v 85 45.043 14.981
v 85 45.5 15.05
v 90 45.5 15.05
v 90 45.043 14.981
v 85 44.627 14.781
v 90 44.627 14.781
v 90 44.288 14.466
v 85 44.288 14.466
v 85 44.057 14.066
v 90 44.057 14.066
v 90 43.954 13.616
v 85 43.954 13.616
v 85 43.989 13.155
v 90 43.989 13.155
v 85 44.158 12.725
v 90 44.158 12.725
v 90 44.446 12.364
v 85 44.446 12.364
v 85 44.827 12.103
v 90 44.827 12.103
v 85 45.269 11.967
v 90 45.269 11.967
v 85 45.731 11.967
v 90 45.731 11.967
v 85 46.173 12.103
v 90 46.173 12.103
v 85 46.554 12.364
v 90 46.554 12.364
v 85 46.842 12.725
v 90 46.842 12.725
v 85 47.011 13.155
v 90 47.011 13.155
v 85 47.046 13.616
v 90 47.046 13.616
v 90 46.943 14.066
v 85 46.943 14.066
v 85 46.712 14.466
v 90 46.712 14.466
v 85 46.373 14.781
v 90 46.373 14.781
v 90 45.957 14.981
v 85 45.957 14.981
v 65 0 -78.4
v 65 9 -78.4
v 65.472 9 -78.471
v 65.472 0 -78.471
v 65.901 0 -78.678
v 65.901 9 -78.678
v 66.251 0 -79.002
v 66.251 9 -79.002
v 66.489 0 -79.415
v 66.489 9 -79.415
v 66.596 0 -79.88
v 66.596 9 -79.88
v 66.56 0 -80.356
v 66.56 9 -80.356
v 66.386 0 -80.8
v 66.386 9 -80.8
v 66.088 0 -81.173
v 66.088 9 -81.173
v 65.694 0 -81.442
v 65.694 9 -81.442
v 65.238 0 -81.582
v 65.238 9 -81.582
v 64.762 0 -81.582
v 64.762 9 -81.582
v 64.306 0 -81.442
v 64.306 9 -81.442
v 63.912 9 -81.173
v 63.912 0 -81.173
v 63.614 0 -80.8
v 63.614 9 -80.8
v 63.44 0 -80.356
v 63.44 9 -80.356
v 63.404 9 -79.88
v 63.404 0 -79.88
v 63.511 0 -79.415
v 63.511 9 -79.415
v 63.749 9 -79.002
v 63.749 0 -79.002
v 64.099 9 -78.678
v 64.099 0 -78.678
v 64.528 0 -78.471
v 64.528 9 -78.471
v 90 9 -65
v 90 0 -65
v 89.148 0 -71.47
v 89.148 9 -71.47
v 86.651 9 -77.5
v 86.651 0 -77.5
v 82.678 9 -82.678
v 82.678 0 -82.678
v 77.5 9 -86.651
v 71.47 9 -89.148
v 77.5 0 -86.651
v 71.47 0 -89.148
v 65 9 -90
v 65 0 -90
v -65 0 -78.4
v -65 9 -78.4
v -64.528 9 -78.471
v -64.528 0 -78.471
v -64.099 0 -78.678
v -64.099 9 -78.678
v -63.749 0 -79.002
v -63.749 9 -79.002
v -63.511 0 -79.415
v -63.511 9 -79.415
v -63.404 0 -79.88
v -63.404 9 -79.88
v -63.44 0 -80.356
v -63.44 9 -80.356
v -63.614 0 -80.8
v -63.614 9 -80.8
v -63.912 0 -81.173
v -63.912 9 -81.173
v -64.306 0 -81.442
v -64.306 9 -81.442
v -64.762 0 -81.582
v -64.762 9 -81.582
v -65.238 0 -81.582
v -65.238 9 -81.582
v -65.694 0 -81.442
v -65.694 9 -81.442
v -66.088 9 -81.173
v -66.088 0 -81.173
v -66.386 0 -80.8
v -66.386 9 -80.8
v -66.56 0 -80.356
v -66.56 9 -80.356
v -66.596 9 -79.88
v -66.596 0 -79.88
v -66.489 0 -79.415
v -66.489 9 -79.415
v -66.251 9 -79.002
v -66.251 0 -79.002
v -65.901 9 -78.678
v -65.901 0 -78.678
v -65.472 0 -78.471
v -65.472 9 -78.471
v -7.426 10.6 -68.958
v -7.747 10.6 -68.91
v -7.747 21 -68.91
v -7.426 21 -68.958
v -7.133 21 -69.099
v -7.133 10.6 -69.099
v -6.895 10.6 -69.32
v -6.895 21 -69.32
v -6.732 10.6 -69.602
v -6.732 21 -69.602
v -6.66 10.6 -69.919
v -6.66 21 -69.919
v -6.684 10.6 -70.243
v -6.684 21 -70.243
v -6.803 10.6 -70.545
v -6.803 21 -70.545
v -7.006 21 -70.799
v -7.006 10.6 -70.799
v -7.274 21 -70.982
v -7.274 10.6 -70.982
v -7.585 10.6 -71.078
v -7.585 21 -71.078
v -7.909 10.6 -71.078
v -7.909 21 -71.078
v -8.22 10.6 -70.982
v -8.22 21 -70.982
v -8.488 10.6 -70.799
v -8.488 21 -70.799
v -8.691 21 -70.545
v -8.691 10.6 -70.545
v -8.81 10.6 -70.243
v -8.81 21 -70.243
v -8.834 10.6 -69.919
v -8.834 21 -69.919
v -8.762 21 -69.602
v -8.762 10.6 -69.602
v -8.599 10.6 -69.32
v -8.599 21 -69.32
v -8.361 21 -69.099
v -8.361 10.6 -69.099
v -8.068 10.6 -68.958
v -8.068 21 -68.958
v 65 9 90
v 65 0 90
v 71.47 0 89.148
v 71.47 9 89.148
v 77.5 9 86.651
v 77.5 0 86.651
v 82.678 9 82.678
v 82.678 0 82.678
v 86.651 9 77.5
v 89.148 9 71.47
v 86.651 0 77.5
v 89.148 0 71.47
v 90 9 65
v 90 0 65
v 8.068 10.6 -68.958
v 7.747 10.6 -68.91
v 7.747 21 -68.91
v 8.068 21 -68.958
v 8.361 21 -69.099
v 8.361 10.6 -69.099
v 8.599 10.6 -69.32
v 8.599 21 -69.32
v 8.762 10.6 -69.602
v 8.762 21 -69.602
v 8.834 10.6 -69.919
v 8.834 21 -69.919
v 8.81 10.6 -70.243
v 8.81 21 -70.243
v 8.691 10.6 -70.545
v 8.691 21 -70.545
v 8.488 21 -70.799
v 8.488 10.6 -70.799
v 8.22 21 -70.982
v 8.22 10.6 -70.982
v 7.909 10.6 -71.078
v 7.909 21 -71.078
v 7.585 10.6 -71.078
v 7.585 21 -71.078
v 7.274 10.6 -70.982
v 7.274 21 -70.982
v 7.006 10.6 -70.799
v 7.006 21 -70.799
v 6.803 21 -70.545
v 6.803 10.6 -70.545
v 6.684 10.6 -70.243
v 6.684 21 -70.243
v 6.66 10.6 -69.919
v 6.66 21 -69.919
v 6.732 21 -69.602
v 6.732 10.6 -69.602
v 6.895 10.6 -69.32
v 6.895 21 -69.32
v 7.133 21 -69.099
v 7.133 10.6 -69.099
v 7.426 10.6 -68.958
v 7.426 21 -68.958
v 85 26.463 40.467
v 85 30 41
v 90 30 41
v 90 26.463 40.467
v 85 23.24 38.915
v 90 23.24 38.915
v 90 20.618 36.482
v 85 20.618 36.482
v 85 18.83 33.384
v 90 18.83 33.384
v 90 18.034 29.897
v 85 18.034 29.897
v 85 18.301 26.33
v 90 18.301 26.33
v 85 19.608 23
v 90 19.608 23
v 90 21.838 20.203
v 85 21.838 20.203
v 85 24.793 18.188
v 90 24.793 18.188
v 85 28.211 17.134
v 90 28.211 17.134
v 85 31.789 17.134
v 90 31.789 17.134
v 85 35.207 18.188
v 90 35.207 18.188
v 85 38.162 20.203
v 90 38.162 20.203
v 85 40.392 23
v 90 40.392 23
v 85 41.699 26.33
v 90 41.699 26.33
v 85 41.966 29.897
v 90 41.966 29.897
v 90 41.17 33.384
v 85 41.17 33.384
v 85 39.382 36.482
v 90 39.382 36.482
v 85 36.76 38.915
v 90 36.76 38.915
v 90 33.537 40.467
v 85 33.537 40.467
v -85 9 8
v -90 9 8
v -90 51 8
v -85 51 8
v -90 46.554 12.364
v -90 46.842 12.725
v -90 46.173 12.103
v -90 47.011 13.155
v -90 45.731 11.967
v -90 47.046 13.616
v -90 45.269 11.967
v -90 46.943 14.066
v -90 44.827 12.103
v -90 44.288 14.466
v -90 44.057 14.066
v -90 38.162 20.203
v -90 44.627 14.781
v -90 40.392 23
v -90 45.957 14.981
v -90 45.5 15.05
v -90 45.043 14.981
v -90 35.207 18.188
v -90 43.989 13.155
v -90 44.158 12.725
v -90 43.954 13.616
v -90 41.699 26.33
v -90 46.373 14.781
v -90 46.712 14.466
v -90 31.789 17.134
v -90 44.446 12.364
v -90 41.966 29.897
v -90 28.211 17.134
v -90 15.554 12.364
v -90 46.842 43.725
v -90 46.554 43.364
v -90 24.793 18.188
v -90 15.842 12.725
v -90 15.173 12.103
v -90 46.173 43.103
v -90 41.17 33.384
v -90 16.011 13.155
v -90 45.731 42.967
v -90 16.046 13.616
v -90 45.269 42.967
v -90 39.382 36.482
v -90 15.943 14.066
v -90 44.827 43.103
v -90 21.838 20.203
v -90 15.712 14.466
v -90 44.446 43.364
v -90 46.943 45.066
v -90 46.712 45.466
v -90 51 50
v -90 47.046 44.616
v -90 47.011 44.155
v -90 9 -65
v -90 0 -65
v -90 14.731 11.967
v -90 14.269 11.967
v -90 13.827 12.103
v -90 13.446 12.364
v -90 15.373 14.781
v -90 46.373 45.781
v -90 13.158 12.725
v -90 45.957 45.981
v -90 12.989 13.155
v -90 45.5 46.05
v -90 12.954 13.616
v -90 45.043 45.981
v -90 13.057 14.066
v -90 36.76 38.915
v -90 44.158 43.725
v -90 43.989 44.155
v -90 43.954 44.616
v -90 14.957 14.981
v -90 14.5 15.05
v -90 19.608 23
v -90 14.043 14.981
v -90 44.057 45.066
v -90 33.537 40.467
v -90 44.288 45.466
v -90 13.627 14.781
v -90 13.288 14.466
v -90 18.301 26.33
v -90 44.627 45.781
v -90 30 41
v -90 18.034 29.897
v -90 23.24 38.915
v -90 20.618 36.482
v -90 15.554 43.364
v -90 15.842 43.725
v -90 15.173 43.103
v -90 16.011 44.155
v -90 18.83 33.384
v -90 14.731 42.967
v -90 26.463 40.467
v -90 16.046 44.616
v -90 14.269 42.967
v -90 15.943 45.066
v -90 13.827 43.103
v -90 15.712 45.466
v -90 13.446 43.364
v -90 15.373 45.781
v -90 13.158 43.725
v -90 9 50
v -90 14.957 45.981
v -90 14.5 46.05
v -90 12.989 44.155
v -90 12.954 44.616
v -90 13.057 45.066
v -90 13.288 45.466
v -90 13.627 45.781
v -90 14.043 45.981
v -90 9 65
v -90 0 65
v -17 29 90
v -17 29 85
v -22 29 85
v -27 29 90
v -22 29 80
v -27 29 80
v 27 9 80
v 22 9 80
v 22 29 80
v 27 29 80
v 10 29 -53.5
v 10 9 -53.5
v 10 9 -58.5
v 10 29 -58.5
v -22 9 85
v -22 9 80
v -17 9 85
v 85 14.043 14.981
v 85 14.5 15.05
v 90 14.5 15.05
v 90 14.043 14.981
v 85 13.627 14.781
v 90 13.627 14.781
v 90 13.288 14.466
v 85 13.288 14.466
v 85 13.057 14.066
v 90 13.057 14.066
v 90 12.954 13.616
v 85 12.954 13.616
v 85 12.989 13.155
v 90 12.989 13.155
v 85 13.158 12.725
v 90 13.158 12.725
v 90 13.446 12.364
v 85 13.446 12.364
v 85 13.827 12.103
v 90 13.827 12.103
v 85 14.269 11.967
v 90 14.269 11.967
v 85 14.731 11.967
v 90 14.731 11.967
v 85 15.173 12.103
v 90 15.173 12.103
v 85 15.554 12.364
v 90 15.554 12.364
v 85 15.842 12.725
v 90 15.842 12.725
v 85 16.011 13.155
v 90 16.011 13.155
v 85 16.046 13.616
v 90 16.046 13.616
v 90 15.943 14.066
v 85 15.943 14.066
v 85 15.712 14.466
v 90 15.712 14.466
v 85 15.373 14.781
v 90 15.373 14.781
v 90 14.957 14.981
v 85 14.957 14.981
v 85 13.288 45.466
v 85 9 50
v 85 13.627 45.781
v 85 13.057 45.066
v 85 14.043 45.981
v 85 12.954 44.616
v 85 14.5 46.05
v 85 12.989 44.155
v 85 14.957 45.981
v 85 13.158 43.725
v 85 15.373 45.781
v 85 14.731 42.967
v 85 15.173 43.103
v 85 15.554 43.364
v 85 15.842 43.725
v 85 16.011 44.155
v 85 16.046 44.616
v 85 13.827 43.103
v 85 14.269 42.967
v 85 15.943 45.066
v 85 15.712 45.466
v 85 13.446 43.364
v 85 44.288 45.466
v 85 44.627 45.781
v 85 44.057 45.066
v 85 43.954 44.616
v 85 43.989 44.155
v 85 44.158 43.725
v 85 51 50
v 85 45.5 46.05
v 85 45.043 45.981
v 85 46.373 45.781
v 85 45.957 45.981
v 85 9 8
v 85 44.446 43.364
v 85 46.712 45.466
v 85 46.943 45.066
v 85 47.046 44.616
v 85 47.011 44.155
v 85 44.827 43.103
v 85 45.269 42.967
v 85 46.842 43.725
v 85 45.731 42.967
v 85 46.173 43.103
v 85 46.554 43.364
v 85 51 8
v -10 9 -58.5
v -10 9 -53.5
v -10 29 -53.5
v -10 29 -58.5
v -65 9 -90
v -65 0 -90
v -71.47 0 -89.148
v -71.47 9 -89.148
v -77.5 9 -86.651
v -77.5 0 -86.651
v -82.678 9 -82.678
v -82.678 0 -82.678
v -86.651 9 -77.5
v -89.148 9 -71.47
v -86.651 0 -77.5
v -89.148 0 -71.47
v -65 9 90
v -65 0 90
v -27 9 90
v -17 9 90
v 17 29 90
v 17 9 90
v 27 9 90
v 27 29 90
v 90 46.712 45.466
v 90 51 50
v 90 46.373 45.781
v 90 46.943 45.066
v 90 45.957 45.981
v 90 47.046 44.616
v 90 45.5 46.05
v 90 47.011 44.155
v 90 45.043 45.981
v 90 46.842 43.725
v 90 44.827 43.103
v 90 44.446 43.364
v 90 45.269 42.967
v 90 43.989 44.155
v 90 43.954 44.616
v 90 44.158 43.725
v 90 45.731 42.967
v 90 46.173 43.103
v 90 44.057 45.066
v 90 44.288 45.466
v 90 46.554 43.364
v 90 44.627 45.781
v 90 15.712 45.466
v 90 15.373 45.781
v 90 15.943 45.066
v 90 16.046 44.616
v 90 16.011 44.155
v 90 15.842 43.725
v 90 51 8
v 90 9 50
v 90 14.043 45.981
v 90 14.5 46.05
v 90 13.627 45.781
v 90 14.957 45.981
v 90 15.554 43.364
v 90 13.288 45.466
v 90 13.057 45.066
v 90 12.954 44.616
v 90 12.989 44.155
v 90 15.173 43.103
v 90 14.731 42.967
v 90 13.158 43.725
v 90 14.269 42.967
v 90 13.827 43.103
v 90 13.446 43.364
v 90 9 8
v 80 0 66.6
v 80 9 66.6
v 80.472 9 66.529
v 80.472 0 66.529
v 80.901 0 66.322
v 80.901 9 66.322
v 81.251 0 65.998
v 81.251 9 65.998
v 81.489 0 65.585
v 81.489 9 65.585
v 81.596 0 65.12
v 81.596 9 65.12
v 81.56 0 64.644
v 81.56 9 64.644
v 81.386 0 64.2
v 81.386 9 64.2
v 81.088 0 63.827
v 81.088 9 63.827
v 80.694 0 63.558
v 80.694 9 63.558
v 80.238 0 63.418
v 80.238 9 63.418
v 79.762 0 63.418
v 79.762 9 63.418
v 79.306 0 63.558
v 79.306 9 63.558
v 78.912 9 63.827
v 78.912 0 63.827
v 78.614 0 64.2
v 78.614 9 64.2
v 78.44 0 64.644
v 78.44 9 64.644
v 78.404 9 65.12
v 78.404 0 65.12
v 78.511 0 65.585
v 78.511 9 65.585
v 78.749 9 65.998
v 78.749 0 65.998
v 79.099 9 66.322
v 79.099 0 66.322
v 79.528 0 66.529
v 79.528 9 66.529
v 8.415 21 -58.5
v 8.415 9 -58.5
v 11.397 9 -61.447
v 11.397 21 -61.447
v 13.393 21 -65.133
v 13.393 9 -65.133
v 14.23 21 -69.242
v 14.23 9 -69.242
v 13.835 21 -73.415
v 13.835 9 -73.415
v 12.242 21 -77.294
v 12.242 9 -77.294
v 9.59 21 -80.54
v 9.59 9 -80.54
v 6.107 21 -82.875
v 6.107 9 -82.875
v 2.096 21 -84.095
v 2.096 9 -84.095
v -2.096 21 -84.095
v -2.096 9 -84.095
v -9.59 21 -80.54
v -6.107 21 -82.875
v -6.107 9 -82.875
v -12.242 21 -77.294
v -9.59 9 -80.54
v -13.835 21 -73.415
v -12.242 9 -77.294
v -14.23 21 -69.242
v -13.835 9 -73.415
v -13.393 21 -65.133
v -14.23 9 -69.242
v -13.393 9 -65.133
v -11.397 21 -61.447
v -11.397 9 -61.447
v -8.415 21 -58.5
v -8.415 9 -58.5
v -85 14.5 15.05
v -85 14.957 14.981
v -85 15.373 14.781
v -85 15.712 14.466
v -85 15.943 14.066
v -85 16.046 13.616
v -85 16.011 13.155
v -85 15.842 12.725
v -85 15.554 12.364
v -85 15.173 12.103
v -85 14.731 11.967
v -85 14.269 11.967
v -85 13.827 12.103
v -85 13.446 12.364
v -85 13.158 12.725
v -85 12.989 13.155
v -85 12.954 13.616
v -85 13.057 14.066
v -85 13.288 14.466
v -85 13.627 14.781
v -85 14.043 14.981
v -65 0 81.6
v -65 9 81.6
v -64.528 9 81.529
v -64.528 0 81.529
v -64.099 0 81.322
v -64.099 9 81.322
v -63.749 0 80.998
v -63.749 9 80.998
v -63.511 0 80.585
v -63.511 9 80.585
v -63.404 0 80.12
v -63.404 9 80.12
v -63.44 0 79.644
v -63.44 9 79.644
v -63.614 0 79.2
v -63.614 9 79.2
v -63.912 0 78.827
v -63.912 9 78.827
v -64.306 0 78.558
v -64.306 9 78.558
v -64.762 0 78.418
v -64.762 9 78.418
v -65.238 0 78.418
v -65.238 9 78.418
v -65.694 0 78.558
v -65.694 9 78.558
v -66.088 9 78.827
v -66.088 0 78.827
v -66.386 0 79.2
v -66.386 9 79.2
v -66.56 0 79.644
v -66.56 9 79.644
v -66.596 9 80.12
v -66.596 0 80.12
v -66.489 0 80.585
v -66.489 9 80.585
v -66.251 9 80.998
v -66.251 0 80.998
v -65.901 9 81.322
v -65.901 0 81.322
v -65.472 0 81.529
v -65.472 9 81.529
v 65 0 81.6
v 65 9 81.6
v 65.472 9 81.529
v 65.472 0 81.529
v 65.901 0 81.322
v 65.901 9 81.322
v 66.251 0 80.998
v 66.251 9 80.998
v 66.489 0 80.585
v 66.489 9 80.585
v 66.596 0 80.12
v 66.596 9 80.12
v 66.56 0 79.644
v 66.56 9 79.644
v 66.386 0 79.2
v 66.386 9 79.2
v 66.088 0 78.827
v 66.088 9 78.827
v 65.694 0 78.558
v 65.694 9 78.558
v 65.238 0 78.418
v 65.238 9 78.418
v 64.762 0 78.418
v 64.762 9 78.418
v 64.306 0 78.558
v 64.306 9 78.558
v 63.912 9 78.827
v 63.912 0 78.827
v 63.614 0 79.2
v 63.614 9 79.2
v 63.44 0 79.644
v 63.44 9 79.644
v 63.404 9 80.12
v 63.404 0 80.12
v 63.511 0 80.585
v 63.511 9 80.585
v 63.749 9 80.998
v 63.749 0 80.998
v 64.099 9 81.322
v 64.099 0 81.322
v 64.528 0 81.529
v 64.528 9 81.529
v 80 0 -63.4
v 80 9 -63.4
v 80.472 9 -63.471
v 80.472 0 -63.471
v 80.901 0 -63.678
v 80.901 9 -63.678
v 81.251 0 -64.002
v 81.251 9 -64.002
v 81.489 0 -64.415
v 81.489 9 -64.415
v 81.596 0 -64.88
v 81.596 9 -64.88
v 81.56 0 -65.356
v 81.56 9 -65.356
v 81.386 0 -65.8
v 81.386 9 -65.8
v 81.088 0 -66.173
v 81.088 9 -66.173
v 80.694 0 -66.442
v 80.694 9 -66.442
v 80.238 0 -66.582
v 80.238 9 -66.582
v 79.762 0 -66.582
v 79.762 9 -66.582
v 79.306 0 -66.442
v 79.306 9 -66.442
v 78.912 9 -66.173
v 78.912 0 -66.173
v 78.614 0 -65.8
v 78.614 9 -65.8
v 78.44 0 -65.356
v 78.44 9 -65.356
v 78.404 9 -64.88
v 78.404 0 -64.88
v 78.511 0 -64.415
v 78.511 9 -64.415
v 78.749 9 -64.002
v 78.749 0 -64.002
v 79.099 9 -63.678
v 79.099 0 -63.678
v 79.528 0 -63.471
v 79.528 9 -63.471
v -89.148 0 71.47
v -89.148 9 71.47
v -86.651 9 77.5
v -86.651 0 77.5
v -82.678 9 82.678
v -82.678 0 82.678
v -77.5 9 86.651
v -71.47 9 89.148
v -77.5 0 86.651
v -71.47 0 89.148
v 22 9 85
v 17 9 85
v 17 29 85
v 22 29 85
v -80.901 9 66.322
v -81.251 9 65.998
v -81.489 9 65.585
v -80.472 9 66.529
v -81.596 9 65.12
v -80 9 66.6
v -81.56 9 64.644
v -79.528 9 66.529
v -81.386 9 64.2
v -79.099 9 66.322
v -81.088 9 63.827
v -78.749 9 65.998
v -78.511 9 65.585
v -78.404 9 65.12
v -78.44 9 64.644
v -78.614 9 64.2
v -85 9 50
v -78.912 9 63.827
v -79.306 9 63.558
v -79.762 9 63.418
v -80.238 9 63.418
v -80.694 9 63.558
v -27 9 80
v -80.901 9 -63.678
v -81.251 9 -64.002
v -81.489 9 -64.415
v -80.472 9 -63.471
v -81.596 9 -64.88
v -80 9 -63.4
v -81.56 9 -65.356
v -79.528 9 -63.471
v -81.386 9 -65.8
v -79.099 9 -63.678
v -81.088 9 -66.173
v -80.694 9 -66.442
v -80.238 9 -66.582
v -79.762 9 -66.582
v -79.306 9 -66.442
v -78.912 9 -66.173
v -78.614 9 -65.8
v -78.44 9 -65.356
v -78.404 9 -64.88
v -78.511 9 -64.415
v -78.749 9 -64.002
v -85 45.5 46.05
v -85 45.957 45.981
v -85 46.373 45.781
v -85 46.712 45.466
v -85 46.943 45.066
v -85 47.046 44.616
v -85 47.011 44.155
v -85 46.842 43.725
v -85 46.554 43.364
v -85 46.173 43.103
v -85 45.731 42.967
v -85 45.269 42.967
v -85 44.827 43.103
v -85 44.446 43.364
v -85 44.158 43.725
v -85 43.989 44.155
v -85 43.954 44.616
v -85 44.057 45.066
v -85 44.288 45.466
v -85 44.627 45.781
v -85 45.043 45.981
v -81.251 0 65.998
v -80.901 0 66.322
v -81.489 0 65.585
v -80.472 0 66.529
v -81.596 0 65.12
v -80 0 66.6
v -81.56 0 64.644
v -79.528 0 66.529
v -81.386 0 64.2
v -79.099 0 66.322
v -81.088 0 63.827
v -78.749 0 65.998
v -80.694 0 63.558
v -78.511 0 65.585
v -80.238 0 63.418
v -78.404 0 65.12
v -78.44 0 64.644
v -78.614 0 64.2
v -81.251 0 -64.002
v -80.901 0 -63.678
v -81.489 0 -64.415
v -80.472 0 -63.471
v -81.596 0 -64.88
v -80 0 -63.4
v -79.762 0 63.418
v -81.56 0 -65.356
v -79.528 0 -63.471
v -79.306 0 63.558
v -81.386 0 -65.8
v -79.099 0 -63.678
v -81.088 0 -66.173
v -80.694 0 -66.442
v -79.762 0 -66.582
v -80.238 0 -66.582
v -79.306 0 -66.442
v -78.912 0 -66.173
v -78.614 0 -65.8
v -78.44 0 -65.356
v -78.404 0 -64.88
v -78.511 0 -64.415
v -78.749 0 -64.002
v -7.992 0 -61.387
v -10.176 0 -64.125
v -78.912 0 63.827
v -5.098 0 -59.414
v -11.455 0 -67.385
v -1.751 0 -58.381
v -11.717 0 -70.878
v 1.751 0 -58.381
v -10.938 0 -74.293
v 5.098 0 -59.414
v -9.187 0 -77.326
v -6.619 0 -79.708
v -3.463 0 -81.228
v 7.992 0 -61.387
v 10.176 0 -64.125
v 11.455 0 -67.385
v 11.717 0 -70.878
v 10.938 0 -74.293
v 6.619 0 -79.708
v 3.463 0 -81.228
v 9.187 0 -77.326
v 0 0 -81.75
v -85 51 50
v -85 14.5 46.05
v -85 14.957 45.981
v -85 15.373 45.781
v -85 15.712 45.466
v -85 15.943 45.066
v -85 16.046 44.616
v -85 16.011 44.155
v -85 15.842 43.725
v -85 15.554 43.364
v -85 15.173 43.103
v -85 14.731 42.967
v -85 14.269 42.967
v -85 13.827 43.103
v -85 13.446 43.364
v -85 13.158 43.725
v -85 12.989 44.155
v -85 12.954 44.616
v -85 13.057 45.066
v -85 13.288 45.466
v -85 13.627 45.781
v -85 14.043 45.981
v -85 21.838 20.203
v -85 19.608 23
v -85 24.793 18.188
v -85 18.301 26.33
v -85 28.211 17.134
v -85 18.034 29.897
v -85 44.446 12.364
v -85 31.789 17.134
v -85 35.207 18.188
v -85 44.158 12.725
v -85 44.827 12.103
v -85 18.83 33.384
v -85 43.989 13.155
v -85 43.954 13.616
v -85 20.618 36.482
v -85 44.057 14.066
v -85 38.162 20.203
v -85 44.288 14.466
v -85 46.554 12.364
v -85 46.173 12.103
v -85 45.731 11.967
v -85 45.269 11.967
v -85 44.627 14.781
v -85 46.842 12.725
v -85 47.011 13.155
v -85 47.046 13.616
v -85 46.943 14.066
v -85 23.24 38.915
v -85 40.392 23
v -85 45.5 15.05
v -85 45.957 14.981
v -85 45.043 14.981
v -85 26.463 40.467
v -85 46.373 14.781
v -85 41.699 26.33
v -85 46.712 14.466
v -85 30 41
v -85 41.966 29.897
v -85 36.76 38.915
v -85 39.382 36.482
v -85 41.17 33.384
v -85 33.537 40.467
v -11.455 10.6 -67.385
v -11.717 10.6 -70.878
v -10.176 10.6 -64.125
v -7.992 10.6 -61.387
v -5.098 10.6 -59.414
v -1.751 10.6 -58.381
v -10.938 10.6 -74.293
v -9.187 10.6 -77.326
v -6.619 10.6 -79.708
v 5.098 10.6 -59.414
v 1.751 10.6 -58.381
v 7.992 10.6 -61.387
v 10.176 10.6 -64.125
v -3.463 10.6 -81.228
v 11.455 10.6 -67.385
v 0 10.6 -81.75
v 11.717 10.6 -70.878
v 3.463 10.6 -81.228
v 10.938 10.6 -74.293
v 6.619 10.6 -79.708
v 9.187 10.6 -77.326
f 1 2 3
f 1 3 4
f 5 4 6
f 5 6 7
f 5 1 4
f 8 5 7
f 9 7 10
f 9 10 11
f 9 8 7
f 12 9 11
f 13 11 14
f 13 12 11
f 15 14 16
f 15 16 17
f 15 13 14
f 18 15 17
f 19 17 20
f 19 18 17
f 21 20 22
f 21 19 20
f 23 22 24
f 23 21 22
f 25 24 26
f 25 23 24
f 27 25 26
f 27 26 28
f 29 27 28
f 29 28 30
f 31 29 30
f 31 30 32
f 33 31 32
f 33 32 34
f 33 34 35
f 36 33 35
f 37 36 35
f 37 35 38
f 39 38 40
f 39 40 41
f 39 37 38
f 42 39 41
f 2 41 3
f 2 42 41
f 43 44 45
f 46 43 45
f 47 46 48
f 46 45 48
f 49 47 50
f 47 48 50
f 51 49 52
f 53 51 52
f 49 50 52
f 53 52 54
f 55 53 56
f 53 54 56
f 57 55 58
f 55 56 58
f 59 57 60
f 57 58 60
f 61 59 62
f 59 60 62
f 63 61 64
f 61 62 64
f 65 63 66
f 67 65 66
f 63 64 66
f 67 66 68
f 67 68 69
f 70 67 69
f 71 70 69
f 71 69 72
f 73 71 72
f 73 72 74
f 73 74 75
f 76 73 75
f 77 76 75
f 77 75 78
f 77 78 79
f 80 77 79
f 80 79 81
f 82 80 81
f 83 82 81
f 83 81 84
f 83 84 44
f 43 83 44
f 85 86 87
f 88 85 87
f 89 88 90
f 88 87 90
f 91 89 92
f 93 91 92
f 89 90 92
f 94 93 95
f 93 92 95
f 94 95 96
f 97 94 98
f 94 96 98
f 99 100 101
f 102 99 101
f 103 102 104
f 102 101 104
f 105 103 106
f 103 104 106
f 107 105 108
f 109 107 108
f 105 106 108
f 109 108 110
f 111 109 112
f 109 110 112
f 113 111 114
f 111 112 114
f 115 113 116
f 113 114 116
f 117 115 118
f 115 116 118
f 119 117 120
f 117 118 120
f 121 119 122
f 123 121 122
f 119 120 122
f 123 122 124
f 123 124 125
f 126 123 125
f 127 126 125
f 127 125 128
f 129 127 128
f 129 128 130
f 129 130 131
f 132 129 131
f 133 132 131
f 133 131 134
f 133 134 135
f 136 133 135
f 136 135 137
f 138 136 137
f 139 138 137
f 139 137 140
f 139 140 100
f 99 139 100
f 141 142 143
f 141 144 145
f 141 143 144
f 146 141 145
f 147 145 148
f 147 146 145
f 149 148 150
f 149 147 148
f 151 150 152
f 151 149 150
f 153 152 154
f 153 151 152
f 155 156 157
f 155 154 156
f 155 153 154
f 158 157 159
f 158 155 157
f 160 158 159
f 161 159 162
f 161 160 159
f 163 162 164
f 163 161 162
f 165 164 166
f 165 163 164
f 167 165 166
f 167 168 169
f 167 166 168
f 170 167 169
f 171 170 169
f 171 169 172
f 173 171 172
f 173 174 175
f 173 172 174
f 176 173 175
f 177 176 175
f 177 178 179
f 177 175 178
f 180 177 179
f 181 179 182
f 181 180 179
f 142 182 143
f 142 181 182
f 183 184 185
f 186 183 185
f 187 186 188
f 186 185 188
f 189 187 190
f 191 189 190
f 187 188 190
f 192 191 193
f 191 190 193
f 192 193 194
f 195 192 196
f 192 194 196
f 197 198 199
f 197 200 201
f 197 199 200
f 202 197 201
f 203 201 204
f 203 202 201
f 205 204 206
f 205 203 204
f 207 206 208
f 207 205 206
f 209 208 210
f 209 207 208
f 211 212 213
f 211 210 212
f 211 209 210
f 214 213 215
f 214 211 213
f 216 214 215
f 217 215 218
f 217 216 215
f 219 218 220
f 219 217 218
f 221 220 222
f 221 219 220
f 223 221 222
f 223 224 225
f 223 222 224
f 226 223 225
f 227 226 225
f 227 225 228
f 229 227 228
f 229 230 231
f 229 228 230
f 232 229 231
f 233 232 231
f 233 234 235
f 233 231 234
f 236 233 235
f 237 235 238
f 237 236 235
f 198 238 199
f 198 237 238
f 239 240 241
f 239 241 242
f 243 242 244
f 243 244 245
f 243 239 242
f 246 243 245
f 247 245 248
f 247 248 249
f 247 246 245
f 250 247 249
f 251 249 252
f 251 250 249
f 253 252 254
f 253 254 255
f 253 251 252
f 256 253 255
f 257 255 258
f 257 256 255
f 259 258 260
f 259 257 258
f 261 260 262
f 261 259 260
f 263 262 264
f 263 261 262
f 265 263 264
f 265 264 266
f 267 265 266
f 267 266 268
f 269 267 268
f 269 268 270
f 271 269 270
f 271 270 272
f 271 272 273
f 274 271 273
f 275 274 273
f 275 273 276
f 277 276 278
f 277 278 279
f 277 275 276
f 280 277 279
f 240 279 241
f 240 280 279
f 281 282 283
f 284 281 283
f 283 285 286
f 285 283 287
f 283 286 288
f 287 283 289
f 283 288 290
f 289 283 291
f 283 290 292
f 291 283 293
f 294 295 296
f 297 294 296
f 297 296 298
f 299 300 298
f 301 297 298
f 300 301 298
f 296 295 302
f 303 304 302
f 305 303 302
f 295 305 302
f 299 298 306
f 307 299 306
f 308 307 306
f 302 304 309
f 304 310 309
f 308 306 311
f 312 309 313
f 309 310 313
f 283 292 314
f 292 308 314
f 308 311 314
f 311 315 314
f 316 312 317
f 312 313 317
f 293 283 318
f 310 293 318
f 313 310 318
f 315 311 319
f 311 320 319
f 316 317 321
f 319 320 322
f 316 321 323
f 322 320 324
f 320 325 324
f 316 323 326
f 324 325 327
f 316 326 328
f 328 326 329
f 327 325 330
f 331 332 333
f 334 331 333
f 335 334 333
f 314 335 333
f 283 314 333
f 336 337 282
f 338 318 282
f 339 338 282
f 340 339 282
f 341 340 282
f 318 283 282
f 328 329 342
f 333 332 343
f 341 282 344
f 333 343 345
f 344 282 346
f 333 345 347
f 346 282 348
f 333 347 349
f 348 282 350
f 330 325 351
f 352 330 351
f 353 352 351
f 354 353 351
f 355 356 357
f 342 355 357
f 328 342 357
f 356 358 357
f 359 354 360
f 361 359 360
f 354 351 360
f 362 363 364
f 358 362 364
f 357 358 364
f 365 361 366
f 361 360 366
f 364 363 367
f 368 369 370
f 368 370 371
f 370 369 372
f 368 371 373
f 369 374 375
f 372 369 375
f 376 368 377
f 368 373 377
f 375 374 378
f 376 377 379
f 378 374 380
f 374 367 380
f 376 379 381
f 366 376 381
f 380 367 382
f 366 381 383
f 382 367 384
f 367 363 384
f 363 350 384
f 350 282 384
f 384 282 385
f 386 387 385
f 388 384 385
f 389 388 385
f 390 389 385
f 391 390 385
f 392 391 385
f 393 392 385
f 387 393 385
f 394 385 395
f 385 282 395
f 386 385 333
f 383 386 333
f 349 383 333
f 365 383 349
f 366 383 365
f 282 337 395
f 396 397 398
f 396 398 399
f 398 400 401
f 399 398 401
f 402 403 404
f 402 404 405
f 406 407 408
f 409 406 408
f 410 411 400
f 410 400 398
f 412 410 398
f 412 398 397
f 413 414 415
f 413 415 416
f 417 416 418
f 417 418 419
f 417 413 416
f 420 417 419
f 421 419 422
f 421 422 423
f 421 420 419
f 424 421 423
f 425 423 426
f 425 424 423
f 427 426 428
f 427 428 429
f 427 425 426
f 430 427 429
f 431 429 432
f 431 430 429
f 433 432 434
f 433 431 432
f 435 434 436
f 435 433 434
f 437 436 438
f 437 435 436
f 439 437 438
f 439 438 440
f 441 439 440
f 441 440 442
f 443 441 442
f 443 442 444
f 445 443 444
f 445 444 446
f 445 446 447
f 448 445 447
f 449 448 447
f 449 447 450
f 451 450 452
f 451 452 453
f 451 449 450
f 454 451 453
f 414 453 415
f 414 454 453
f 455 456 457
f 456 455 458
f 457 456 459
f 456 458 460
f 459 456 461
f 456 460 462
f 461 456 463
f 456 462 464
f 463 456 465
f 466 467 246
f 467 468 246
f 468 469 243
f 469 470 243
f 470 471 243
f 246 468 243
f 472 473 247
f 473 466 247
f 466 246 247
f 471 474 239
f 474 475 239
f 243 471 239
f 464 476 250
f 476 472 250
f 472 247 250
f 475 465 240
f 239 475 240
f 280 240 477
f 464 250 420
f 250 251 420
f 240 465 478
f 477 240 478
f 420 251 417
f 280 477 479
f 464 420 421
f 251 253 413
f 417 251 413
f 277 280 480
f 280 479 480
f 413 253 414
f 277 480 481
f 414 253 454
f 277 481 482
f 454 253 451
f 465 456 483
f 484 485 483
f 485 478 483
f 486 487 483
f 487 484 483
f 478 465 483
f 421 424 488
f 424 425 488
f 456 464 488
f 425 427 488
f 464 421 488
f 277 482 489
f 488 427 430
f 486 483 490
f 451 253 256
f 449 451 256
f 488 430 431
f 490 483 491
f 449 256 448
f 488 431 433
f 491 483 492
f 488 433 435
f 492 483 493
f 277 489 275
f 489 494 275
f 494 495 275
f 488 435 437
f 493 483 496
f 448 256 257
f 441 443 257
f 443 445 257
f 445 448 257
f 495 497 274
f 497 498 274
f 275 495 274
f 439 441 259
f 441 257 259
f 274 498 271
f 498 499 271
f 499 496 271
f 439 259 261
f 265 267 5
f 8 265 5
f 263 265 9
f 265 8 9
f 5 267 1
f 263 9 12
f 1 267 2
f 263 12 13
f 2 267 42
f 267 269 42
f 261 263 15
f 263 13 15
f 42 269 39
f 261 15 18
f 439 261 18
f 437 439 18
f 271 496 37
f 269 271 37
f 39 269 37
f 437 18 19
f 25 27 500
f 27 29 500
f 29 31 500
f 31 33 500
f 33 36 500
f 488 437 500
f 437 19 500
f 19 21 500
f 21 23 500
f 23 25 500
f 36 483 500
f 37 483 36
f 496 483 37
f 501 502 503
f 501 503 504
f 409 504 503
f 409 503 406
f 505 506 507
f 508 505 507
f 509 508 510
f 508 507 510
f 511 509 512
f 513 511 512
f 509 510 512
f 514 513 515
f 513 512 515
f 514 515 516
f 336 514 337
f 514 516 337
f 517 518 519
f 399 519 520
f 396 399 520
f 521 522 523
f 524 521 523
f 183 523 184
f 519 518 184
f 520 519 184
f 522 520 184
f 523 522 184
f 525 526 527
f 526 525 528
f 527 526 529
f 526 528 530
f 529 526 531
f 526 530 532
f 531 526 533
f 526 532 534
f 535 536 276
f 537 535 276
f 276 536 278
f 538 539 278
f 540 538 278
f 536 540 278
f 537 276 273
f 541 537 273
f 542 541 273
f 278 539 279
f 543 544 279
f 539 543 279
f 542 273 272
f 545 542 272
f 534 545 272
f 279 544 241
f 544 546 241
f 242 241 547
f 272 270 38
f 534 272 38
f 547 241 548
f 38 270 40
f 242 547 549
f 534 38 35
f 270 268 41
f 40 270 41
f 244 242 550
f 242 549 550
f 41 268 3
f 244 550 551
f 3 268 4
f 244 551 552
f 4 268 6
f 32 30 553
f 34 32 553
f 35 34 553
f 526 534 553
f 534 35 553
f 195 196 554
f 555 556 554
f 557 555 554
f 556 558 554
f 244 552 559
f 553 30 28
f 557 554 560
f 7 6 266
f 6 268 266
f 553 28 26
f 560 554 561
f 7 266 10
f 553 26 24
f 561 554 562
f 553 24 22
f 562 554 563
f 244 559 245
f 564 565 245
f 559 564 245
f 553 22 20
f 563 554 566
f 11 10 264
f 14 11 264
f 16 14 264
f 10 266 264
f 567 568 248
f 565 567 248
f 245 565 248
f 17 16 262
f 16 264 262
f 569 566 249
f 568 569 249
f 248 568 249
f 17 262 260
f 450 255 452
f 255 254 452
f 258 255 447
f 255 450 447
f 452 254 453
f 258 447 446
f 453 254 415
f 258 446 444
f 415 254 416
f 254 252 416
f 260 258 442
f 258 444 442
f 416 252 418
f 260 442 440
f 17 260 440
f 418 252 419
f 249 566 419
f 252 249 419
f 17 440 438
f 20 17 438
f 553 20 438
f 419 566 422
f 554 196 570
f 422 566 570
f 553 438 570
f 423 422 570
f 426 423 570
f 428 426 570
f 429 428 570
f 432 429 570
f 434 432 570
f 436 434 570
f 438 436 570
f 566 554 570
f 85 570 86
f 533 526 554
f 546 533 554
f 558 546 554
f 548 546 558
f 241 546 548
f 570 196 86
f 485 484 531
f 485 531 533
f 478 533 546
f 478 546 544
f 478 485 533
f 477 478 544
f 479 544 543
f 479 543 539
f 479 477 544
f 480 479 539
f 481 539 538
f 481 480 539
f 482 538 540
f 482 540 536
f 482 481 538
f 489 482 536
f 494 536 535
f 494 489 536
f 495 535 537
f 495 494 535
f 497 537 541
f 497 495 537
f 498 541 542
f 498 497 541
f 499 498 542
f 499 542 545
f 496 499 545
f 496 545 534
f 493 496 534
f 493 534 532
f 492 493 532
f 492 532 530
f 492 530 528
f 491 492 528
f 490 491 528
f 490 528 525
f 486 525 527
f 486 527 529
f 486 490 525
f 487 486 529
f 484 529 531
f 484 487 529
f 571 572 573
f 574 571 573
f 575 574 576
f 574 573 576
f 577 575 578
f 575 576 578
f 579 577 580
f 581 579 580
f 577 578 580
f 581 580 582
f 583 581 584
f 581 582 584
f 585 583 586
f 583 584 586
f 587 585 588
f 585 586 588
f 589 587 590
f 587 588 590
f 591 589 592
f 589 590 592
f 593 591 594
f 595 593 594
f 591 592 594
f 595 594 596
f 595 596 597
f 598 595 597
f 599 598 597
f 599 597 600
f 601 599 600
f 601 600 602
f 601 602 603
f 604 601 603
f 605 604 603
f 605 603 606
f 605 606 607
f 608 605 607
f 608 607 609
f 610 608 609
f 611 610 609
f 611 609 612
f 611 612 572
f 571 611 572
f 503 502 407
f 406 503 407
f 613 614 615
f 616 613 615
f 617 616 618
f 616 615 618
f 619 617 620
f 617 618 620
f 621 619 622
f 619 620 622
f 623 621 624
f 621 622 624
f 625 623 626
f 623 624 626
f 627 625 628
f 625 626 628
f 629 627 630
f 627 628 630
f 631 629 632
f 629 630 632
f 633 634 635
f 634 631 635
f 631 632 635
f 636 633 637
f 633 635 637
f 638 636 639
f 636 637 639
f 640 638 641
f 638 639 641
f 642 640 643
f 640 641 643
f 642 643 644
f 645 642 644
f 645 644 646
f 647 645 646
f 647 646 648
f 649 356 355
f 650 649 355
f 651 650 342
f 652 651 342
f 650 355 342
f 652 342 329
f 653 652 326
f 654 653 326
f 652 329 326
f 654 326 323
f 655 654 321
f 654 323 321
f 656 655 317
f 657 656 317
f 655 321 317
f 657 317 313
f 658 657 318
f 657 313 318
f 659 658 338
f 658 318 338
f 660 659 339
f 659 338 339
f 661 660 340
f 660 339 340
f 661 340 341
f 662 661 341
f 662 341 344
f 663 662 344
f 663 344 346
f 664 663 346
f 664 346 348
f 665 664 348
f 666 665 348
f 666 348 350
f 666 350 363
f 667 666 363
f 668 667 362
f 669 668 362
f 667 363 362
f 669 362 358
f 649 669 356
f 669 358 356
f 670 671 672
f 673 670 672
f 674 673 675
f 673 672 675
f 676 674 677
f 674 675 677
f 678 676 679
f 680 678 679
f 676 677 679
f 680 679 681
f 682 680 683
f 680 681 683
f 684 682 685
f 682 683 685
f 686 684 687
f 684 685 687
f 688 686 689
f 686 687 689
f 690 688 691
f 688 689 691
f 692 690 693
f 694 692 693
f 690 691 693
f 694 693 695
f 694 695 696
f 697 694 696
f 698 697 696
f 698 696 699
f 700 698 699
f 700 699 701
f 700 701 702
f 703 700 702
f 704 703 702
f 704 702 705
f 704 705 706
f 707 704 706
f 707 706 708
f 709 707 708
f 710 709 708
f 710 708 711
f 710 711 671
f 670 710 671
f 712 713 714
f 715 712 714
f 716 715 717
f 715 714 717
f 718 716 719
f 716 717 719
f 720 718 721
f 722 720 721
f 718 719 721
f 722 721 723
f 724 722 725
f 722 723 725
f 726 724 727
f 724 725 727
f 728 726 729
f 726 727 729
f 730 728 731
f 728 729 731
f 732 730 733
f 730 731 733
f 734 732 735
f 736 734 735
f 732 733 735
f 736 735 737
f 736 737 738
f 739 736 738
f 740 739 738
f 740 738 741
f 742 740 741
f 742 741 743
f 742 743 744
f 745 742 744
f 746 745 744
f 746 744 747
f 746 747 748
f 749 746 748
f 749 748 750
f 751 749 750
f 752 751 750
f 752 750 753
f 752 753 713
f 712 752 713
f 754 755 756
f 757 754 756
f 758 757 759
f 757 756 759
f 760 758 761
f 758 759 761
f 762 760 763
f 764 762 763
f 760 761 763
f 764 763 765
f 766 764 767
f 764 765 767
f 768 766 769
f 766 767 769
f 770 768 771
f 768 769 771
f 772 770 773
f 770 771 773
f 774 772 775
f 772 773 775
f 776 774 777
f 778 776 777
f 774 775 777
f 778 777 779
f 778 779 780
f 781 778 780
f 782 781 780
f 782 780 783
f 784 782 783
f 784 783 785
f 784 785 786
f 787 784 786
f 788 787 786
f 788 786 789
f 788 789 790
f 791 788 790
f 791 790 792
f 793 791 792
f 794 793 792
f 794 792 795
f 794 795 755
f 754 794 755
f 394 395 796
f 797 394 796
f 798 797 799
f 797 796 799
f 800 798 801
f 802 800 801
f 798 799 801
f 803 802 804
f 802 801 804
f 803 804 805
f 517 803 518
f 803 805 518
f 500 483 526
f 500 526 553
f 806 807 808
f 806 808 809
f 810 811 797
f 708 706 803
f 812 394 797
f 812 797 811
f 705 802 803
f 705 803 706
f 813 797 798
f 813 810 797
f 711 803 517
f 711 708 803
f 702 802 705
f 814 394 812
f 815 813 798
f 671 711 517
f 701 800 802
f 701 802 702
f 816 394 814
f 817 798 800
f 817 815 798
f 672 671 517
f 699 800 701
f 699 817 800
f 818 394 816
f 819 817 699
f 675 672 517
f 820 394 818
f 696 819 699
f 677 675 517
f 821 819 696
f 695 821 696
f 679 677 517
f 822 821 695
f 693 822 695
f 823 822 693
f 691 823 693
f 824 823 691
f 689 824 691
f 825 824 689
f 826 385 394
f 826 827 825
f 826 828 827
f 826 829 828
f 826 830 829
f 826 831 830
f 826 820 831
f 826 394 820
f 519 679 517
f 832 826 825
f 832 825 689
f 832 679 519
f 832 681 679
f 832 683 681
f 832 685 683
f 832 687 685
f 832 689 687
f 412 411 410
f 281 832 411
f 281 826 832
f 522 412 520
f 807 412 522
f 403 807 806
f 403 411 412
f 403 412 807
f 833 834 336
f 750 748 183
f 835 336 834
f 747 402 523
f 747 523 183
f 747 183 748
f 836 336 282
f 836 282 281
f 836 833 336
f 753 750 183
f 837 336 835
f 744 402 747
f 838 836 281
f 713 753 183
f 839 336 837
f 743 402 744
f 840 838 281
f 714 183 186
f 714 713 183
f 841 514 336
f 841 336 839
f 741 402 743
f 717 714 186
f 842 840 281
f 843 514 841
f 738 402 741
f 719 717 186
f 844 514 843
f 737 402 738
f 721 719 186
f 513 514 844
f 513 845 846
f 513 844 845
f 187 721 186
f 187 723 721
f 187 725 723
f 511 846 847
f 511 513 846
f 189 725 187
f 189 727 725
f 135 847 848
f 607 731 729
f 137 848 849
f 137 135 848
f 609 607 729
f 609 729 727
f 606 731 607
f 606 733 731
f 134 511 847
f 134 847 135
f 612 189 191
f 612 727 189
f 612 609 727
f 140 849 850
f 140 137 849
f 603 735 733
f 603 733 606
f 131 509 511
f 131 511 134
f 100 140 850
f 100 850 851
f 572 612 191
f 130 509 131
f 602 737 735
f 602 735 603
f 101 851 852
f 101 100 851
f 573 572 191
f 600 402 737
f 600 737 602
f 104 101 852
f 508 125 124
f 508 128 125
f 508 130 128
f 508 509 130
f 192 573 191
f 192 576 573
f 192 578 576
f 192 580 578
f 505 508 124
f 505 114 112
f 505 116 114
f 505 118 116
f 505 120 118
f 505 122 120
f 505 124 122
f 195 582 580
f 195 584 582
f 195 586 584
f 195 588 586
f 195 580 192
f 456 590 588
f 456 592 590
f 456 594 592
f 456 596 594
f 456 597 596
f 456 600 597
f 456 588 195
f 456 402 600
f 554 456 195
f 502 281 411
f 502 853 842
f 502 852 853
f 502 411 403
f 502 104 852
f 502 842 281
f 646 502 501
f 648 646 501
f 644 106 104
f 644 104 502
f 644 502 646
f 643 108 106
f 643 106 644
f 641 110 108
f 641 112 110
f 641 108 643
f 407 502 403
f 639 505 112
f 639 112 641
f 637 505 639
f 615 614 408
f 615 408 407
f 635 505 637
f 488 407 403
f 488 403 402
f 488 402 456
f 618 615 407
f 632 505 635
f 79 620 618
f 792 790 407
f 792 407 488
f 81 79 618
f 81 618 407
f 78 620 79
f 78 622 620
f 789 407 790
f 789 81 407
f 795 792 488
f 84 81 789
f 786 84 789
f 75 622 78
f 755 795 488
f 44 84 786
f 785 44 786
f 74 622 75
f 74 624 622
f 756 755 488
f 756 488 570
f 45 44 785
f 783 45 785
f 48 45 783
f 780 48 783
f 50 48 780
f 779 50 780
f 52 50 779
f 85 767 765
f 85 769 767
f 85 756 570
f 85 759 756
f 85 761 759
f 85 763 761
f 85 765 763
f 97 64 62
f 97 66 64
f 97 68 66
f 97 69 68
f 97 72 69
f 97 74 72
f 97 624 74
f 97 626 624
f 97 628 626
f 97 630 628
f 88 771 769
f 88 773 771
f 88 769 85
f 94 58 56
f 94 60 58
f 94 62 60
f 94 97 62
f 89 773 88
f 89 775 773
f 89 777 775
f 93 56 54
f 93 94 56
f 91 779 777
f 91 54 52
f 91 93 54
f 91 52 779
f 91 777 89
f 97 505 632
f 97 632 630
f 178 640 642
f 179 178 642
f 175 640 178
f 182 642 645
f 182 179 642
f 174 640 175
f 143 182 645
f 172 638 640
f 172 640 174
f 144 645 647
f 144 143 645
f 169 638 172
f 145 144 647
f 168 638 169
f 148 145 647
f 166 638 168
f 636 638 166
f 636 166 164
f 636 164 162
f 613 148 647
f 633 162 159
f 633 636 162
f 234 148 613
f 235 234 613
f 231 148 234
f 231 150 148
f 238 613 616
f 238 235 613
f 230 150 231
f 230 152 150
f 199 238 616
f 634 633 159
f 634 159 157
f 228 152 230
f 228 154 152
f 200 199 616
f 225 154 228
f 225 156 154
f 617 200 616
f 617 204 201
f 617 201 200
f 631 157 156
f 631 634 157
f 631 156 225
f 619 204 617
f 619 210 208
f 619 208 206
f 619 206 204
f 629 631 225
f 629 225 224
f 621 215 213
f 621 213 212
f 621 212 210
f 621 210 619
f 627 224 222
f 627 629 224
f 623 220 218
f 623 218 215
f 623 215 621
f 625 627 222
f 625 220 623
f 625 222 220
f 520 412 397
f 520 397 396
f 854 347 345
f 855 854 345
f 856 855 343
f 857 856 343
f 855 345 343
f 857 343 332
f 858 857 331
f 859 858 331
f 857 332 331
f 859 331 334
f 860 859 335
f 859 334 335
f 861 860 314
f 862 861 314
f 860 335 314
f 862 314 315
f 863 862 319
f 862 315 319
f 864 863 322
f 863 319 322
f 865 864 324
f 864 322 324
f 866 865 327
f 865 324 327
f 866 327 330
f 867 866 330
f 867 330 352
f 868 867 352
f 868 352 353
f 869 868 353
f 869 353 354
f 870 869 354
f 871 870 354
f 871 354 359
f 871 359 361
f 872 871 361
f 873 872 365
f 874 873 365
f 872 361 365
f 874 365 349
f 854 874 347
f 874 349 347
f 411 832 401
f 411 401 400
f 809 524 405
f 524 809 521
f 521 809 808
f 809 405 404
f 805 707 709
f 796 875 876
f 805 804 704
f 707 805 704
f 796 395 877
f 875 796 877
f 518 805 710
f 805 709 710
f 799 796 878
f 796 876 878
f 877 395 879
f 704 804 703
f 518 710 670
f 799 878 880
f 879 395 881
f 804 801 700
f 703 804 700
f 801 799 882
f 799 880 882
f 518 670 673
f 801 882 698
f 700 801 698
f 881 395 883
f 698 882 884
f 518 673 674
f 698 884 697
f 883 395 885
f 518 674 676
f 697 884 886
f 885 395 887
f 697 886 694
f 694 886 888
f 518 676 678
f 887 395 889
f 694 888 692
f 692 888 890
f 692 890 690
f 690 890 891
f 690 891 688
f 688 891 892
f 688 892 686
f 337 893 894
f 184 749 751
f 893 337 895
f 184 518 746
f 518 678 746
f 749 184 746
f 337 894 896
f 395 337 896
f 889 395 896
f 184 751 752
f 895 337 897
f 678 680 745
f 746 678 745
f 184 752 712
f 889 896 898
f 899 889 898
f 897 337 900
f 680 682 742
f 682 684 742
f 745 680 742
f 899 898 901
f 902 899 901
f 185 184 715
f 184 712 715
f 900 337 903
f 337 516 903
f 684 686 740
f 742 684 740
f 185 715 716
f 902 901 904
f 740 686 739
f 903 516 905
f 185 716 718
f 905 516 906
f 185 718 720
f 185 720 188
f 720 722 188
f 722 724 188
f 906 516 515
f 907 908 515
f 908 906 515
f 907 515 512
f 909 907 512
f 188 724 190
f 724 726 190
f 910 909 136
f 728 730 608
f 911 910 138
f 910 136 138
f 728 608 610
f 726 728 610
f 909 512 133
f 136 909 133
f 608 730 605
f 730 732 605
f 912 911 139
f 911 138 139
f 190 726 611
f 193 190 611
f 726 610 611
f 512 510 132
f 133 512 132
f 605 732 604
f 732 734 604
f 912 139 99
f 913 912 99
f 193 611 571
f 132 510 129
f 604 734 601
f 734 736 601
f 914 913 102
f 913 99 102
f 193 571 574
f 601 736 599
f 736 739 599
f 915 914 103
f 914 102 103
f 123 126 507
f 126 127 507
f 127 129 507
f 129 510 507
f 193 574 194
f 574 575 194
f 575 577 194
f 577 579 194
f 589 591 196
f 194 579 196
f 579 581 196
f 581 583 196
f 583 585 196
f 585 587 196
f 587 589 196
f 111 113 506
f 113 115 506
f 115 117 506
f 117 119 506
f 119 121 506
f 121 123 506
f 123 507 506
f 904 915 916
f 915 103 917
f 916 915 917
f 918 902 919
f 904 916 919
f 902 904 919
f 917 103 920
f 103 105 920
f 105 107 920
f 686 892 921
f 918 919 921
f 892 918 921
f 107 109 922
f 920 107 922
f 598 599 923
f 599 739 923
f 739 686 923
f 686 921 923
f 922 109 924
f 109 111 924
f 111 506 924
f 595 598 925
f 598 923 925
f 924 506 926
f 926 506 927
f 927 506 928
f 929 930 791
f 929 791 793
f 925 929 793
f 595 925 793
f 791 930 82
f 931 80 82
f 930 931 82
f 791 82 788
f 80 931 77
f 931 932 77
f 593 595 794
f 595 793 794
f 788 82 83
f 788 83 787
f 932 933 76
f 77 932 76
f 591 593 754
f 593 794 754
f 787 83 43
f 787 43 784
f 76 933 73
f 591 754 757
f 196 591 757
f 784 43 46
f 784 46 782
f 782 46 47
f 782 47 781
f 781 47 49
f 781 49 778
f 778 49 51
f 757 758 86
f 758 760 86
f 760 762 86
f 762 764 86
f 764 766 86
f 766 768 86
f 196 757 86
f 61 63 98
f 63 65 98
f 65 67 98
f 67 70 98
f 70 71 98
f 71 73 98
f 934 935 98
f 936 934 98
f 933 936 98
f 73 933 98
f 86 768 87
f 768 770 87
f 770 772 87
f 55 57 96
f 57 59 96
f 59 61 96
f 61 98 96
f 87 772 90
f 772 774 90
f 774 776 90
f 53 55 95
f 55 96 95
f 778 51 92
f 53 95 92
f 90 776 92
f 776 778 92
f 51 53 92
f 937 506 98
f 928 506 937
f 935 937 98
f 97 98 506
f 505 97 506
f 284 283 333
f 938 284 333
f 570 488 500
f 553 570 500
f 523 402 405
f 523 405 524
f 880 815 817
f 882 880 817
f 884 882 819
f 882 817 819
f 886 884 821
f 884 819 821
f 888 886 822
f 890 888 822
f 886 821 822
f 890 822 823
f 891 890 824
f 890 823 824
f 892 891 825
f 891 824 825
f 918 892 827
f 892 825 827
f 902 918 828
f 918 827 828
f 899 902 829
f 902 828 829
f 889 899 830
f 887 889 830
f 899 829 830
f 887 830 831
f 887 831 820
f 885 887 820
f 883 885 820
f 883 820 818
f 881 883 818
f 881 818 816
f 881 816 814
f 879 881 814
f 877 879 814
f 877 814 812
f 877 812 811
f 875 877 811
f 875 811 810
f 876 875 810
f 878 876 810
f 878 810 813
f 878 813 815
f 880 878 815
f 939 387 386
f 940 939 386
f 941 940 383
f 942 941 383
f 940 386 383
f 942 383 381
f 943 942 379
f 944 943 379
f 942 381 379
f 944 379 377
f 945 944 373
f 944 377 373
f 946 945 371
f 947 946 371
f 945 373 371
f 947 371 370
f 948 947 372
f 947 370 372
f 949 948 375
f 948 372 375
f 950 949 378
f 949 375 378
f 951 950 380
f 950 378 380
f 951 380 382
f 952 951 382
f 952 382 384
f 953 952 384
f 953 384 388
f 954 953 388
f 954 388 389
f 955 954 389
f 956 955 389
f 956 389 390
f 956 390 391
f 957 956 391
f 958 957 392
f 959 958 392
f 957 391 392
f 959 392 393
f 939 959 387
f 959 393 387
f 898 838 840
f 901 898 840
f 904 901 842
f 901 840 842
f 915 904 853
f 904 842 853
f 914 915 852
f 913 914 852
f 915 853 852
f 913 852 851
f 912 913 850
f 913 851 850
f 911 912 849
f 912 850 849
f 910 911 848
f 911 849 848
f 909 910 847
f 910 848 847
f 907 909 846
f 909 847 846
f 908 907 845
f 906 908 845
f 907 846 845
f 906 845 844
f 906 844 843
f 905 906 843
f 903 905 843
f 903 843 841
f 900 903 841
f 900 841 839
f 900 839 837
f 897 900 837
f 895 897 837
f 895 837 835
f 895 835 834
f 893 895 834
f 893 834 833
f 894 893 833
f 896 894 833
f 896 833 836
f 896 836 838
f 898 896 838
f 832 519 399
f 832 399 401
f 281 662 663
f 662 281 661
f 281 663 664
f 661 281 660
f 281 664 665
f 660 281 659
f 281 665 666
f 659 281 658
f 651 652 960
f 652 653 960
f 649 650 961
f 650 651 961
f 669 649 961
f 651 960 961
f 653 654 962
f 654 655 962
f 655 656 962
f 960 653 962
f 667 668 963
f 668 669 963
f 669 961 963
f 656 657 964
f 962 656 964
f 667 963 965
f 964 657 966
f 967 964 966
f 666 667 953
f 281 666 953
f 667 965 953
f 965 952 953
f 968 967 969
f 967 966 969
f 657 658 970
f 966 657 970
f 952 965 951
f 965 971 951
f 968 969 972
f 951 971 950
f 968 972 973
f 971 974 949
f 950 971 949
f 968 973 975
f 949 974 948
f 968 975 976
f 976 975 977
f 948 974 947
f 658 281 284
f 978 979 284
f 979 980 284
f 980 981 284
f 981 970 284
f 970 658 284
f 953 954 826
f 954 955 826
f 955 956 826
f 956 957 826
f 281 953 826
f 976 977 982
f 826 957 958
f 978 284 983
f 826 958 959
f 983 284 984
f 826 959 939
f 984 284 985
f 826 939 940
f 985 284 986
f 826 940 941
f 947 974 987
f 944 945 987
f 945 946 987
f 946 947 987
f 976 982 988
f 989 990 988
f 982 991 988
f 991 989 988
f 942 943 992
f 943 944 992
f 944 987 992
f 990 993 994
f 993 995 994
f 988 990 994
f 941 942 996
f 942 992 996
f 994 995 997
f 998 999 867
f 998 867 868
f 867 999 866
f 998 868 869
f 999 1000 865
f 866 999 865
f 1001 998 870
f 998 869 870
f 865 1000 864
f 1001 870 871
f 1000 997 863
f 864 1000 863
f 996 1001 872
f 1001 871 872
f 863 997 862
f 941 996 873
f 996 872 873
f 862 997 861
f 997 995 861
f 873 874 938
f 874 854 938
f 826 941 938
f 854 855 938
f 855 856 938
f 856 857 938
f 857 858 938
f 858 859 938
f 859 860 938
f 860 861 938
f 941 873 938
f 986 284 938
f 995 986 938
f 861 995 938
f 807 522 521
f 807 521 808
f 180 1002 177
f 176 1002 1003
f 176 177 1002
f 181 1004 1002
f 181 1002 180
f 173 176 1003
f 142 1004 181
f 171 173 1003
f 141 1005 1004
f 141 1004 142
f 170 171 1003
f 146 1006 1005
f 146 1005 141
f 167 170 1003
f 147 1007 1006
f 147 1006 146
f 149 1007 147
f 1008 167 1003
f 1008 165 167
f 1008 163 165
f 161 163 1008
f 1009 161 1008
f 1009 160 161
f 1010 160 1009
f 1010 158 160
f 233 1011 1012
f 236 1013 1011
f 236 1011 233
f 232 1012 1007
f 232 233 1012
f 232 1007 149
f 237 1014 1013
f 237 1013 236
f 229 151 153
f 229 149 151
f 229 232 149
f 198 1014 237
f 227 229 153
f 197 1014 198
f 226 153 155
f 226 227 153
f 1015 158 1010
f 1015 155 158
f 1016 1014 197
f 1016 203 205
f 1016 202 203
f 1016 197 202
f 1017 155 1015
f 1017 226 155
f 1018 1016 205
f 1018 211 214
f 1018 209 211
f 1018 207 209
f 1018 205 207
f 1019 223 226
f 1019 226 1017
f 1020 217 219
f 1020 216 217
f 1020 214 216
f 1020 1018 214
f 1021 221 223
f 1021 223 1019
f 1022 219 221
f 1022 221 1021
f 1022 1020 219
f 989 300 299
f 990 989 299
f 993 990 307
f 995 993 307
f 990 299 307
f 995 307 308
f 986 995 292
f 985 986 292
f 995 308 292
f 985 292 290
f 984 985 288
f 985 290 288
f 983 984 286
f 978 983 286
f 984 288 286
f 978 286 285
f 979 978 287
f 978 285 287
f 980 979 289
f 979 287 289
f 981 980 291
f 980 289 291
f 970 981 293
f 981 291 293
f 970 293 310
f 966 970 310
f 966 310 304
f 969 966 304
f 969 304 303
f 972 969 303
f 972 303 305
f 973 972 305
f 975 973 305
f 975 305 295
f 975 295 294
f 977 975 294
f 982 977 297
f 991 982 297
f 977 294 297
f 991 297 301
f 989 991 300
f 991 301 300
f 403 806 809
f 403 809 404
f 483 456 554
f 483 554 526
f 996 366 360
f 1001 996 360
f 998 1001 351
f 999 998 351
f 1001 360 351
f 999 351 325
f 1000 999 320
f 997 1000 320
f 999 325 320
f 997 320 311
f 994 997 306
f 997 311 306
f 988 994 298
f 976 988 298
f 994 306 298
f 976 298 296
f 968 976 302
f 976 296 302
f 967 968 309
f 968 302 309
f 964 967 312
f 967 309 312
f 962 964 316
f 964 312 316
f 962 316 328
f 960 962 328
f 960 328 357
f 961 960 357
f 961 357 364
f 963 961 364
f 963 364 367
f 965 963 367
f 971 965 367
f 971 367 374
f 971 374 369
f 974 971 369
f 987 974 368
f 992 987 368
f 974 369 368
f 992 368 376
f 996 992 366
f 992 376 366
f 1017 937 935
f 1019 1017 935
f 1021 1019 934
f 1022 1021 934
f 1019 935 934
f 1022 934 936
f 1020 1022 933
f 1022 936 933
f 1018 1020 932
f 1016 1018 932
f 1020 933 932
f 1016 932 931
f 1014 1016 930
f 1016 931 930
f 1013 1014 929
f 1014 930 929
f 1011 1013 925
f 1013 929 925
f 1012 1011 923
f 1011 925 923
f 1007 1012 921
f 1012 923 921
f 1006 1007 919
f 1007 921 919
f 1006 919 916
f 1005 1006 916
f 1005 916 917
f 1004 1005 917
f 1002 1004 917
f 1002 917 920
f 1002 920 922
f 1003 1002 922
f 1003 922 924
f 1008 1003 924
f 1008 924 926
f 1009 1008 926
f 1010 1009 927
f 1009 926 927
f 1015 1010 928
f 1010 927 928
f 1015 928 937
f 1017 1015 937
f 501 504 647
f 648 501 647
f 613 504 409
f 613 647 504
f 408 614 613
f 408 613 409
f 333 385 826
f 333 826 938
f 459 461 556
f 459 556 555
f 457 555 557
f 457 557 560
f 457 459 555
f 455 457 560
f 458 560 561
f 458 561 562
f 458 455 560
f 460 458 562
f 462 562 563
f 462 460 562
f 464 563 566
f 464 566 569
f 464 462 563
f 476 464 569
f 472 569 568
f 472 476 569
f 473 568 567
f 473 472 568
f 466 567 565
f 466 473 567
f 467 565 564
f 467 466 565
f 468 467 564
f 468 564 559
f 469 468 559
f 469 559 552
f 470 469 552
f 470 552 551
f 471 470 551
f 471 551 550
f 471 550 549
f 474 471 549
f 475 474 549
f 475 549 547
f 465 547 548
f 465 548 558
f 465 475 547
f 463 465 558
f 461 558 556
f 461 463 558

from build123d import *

# Parameters (mm, degrees)
PLATE_DEPTH             = 9
SKETCH3_R               = 1.6
HEX_HOLES_DEPTH         = 128.597021909
SKETCH4_W               = 20
SKETCH4_H               = 5
BATTERY_HOLDER_DEPTH    = 20
SKETCH5_W               = 42
SKETCH5_H               = 42
SKETCH5_R               = 12
SKETCH5_R_2             = 1.55
BOSS_EXTRUDE2_DEPTH     = 5
BOSS_EXTRUDE3_START     = -5
SKETCH6_W               = 42
SKETCH6_H               = 42
SKETCH6_R               = 12
SKETCH6_R_2             = 1.55
BOSS_EXTRUDE3_DEPTH     = 5
SKETCH8_R               = 14.25
BOSS_EXTRUDE4_DEPTH     = 12
SKETCH7_R               = 11.75
CUT_EXTRUDE1_DEPTH      = 10.6
CASTER_HOLES_DEPTH      = 135.029847422
CASTER_HOLES_DEPTH_BACK = 135.029847422
SKETCH2_R               = 1.09


with BuildPart() as part:
    # Sketch1 → Plate (new body)
    with BuildSketch(Plane(origin=(0, 0, 0), x_dir=(1, 0, 0), z_dir=(0, 1, 0))):
        with BuildLine():
            Line((-65, -90), (65, -90))
            ThreePointArc((65, -90), (82.67766953, -82.67766953), (90, -65))
            Line((90, -65), (90, 65))
            ThreePointArc((90, 65), (82.67766953, 82.67766953), (65, 90))
            Line((65, 90), (-65, 90))
            ThreePointArc((-65, 90), (-82.67766953, 82.67766953), (-90, 65))
            Line((-90, 65), (-90, -65))
            ThreePointArc((-90, -65), (-82.67766953, -82.67766953), (-65, -90))
        make_face()
    extrude(amount=PLATE_DEPTH)

    # Sketch3 → Hex Holes (cut, through all)
    with BuildSketch(Plane(origin=(0, 9, 0), x_dir=(1, 0, 0), z_dir=(0, 1, 0))):
        with Locations(Location((-65, 80, 0), (0, 0, 270))):
            Circle(SKETCH3_R)
        with Locations(Location((-80, 65, 0), (0, 0, 270))):
            Circle(SKETCH3_R)
        with Locations(Location((80, 65, 0), (0, 0, 270))):
            Circle(SKETCH3_R)
        with Locations(Location((80, -65, 0), (0, 0, 270))):
            Circle(SKETCH3_R)
        with Locations(Location((65, 80, 0), (0, 0, 270))):
            Circle(SKETCH3_R)
        with Locations(Location((65, -80, 0), (0, 0, 270))):
            Circle(SKETCH3_R)
        with Locations(Location((-65, -80, 0), (0, 0, 270))):
            Circle(SKETCH3_R)
        with Locations(Location((-80, -65, 0), (0, 0, 270))):
            Circle(SKETCH3_R)
    extrude(amount=-HEX_HOLES_DEPTH, mode=Mode.SUBTRACT)

    # Sketch4 → Battery Holder (add)
    with BuildSketch(Plane(origin=(0, 9, 0), x_dir=(1, 0, 0), z_dir=(0, 1, 0))):
        Polygon((-22, -85), (-17, -85), (-17, -90), (-27, -90), (-27, -80), (-22, -80), align=None)
        Polygon((17, -85), (22, -85), (22, -80), (27, -80), (27, -90), (17, -90), align=None)
        with Locations((0, 56)):
            Rectangle(SKETCH4_W, SKETCH4_H)
    extrude(amount=BATTERY_HOLDER_DEPTH)

    # Sketch5 → Boss-Extrude2 (add)
    with BuildSketch(Plane.ZY.offset(90)):
        with Locations((29, 30)):
            Rectangle(SKETCH5_W, SKETCH5_H)
        with Locations((29, 30)):
            Circle(SKETCH5_R, mode=Mode.SUBTRACT)
        with Locations((13.5, 45.5)):
            Circle(SKETCH5_R_2, mode=Mode.SUBTRACT)
        with Locations((44.5, 45.5)):
            Circle(SKETCH5_R_2, mode=Mode.SUBTRACT)
        with Locations((44.5, 14.5)):
            Circle(SKETCH5_R_2, mode=Mode.SUBTRACT)
        with Locations((13.5, 14.5)):
            Circle(SKETCH5_R_2, mode=Mode.SUBTRACT)
    extrude(amount=-BOSS_EXTRUDE2_DEPTH)

    # Sketch6 → Boss-Extrude3 (add)
    with BuildSketch(Plane(origin=(90, 0, 0), x_dir=(0, 0, -1), z_dir=(1, 0, 0)).offset(BOSS_EXTRUDE3_START)):
        with Locations((-29, 30)):
            Rectangle(SKETCH6_W, SKETCH6_H)
        with Locations(Location((-29, 30, 0), (0, 0, 180))):
            Circle(SKETCH6_R, mode=Mode.SUBTRACT)
        with Locations(Location((-44.5, 45.5, 0), (0, 0, 180))):
            Circle(SKETCH6_R_2, mode=Mode.SUBTRACT)
        with Locations(Location((-13.5, 45.5, 0), (0, 0, 180))):
            Circle(SKETCH6_R_2, mode=Mode.SUBTRACT)
        with Locations(Location((-13.5, 14.5, 0), (0, 0, 180))):
            Circle(SKETCH6_R_2, mode=Mode.SUBTRACT)
        with Locations(Location((-44.5, 14.5, 0), (0, 0, 180))):
            Circle(SKETCH6_R_2, mode=Mode.SUBTRACT)
    extrude(amount=BOSS_EXTRUDE3_DEPTH)

    # Sketch8 → Boss-Extrude4 (add)
    with BuildSketch(Plane(origin=(0, 9, 0), x_dir=(1, 0, 0), z_dir=(0, 1, 0))):
        with Locations((0, 70)):
            Circle(SKETCH8_R)
    extrude(amount=BOSS_EXTRUDE4_DEPTH)

    # Sketch7 → Cut-Extrude1 (cut)
    with BuildSketch(Plane.XZ):
        with Locations(Location((0, -70, 0), (0, 0, 270))):
            Circle(SKETCH7_R)
    extrude(amount=-CUT_EXTRUDE1_DEPTH, mode=Mode.SUBTRACT)

    # Sketch2 → Caster Holes (cut, two sides: drawn at the far end of the back side and taken through both)
    with BuildSketch(Plane(origin=(0, 9, 0), x_dir=(1, 0, 0), z_dir=(0, 1, 0)).offset(-CASTER_HOLES_DEPTH_BACK)):
        with Locations(Location((-7.747, 70, 0), (0, 0, 270))):
            Circle(SKETCH2_R)
        with Locations(Location((7.747, 70, 0), (0, 0, 270))):
            Circle(SKETCH2_R)
    extrude(amount=CASTER_HOLES_DEPTH + CASTER_HOLES_DEPTH_BACK, mode=Mode.SUBTRACT)


solid = part.part
